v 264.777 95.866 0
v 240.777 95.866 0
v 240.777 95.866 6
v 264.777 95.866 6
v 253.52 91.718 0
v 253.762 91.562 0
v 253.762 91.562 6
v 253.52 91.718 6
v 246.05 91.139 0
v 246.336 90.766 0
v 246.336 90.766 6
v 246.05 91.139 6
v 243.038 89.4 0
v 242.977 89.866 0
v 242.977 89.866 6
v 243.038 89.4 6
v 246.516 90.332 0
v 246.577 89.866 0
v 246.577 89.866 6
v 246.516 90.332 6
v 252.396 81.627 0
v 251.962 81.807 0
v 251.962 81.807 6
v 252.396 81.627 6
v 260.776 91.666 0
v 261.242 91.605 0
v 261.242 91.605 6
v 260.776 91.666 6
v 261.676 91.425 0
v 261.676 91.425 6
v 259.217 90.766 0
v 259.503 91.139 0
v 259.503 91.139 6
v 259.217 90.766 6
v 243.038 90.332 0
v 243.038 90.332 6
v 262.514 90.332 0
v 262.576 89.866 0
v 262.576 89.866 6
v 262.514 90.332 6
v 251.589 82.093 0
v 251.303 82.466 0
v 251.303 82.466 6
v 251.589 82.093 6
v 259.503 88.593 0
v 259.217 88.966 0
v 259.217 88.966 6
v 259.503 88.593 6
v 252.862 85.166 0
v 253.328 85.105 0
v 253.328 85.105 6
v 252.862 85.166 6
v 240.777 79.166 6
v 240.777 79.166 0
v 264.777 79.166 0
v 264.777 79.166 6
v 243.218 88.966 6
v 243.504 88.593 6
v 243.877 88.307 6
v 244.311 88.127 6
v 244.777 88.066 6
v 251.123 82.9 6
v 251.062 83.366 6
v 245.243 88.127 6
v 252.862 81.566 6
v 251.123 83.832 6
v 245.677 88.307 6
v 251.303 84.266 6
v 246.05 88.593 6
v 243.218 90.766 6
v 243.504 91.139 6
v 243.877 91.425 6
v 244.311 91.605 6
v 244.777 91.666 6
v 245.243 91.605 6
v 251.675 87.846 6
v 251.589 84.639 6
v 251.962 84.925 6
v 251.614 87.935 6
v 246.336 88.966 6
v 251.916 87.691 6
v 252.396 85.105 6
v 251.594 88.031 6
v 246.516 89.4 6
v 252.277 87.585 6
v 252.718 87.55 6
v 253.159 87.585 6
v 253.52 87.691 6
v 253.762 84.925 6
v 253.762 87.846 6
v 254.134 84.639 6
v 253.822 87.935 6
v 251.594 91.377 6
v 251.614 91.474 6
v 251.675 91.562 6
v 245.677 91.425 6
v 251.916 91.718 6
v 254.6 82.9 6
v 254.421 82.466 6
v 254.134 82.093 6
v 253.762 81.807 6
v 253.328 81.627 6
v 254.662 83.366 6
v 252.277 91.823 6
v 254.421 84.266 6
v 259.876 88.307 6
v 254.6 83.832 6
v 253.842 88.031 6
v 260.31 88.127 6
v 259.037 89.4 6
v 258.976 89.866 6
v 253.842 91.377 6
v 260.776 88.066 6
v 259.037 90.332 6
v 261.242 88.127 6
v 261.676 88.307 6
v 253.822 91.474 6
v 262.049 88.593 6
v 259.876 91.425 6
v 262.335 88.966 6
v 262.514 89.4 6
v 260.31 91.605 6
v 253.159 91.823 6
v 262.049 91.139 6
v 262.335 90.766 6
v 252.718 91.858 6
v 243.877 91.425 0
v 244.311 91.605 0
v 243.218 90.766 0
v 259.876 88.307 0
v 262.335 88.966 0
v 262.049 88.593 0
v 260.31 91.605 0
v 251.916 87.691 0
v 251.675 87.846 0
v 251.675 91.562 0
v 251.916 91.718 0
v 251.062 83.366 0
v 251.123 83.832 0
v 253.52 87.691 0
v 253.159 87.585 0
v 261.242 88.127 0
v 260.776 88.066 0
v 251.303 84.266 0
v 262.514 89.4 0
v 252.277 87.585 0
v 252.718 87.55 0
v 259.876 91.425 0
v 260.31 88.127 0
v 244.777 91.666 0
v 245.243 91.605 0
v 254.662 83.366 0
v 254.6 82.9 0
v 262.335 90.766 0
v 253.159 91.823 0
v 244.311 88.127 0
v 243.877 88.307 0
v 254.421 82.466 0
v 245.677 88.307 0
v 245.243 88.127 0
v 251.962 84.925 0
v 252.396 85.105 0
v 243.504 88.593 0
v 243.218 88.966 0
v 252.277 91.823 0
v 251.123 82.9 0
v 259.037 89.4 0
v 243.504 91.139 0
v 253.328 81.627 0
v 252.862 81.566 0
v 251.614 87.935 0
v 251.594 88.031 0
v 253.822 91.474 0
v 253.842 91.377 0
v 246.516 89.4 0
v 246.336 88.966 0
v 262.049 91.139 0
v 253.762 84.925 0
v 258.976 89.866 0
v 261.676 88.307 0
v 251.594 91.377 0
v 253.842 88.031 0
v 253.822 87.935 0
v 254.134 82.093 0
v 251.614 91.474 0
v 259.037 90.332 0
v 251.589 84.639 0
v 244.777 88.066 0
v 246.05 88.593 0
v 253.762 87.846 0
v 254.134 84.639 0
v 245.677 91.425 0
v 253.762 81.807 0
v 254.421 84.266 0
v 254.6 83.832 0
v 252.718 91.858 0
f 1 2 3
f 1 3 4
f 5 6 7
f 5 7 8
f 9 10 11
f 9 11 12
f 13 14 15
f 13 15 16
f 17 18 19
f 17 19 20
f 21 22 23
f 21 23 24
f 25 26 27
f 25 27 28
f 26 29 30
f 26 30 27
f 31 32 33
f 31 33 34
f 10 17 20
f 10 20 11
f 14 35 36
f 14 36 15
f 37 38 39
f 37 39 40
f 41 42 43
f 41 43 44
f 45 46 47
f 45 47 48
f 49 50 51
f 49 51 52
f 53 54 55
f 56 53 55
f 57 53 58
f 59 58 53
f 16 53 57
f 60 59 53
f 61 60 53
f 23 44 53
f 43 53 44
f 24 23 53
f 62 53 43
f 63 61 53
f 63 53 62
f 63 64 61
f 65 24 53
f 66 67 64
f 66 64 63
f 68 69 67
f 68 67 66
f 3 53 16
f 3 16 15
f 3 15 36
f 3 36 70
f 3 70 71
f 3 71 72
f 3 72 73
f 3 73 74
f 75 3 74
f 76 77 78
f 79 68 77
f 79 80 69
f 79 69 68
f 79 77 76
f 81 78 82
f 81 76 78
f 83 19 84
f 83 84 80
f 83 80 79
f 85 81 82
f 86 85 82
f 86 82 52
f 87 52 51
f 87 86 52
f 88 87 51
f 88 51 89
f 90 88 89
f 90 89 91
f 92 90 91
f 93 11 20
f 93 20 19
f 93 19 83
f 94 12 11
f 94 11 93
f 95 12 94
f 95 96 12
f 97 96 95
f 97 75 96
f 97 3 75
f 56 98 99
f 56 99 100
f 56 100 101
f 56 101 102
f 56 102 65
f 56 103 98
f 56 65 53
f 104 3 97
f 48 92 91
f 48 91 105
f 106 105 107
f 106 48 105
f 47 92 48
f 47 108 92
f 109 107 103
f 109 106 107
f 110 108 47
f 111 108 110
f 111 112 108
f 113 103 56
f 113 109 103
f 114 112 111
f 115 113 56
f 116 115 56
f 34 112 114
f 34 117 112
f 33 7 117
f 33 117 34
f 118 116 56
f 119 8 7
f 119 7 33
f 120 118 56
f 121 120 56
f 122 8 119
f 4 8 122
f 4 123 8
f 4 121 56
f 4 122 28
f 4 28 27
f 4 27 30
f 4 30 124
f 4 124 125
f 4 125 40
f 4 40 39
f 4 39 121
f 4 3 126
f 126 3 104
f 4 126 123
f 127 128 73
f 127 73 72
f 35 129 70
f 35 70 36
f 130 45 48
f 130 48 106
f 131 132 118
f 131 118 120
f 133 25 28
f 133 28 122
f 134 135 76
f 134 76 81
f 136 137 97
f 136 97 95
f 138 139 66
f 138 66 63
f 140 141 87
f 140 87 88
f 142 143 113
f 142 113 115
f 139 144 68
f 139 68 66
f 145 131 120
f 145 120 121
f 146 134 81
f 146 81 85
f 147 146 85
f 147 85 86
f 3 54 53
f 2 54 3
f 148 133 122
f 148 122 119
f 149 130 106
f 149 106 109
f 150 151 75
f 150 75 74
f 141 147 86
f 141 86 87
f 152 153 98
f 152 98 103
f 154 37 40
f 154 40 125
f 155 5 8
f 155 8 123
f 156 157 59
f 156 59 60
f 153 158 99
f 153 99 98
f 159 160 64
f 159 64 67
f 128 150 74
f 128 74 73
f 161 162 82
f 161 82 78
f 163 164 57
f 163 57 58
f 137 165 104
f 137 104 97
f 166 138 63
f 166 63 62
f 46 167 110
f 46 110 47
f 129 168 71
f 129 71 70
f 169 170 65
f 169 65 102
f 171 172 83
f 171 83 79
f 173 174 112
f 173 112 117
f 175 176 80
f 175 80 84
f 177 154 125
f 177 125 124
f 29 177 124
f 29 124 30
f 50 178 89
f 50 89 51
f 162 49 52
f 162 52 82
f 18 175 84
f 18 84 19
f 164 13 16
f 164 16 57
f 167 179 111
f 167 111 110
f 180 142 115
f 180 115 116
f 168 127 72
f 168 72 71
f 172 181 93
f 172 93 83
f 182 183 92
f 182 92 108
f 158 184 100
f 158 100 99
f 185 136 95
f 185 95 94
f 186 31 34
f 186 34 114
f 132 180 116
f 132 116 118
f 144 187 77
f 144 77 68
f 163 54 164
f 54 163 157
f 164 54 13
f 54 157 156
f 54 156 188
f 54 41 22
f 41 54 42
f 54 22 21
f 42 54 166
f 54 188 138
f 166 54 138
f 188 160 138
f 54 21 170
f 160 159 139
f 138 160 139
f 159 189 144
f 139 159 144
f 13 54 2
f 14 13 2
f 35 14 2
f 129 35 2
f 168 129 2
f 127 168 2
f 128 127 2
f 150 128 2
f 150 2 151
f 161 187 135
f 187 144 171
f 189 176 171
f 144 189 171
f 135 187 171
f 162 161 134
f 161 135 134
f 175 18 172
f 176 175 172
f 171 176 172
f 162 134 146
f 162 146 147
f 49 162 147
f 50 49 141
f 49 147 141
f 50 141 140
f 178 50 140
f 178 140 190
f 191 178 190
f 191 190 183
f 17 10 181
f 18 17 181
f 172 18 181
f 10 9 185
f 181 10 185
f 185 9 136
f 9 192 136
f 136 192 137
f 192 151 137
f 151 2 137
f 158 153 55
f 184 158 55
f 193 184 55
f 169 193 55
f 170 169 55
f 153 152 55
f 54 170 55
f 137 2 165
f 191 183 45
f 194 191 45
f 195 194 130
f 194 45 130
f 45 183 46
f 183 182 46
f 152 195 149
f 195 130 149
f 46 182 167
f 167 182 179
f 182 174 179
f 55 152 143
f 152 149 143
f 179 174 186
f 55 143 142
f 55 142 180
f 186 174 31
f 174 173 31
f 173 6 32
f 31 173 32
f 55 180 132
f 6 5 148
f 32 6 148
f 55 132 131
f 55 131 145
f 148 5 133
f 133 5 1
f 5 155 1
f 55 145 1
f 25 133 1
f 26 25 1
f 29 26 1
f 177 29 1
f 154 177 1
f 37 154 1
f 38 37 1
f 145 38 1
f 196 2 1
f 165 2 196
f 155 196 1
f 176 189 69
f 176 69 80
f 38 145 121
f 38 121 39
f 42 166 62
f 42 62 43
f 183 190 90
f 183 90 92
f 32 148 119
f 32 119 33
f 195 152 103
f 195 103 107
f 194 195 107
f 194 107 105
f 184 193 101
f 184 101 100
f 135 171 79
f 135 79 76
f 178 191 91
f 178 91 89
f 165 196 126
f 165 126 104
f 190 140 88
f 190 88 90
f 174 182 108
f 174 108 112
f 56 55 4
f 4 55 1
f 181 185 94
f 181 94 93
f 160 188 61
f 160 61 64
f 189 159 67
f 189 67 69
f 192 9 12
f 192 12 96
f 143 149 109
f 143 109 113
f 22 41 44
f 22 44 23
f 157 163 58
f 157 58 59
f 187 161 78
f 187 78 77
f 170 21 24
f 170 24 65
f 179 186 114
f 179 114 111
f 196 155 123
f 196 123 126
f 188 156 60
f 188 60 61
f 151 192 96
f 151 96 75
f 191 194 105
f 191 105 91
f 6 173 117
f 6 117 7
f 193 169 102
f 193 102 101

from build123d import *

# Parameters (mm, degrees)
SKETCH1_W           = 23.99999232
SKETCH1_H           = 16.699994656
BOSS_EXTRUDE1_DEPTH = 6


with BuildPart() as part:
    # Sketch1 → Boss-Extrude1 (new body)
    with BuildSketch(Plane.XY):
        with Locations((252.776898883, 87.516141094)):
            Rectangle(SKETCH1_W, SKETCH1_H)
        Polygon((254.420508276, 82.46614271), (254.600328979, 82.90026829), (254.661662472, 83.366142422), (254.600328979, 83.832016554), (254.420508276, 84.266142134), (254.134454846, 84.638934221), (253.76166276, 84.92498765), (253.32753718, 85.104808353), (252.861663048, 85.166141846), (252.395788915, 85.104808353), (251.961663336, 84.92498765), (251.588871249, 84.638934221), (251.30281782, 84.266142134), (251.122997117, 83.832016554), (251.061663624, 83.366142422), (251.122997117, 82.90026829), (251.30281782, 82.46614271), (251.588871249, 82.093350624), (251.961663336, 81.807297194), (252.395788915, 81.627476491), (252.861663048, 81.566142998), (253.32753718, 81.627476491), (253.76166276, 81.807297194), (254.134454846, 82.093350624), align=None, mode=Mode.SUBTRACT)
        Polygon((260.30990578, 88.127474411), (260.775779912, 88.066140918), (261.241654045, 88.127474411), (261.675779624, 88.307295114), (262.048571711, 88.593348544), (262.33462514, 88.96614063), (262.514445843, 89.40026621), (262.575779336, 89.866140342), (262.514445843, 90.332014474), (262.33462514, 90.766140054), (262.048571711, 91.138932141), (261.675779624, 91.42498557), (261.241654045, 91.604806273), (260.775779912, 91.666139766), (260.30990578, 91.604806273), (259.8757802, 91.42498557), (259.502988114, 91.138932141), (259.216934685, 90.766140054), (259.037113982, 90.332014474), (258.975780488, 89.866140342), (259.037113982, 89.40026621), (259.216934685, 88.96614063), (259.502988114, 88.593348544), (259.8757802, 88.307295114), align=None, mode=Mode.SUBTRACT)
        Polygon((246.335746671, 90.766140054), (246.049693242, 91.138932141), (245.676901155, 91.42498557), (245.242775575, 91.604806273), (244.776901443, 91.666139766), (244.311027311, 91.604806273), (243.876901731, 91.42498557), (243.504109644, 91.138932141), (243.218056215, 90.766140054), (243.038235512, 90.332014474), (242.976902019, 89.866140342), (243.038235512, 89.40026621), (243.218056215, 88.96614063), (243.504109644, 88.593348544), (243.876901731, 88.307295114), (244.311027311, 88.127474411), (244.776901443, 88.066140918), (245.242775575, 88.127474411), (245.676901155, 88.307295114), (246.049693242, 88.593348544), (246.335746671, 88.96614063), (246.515567374, 89.40026621), (246.576900867, 89.866140342), (246.515567374, 90.332014474), align=None, mode=Mode.SUBTRACT)
        Polygon((251.594211482, 88.030941424), (251.614308424, 87.934752995), (251.674599249, 87.845978104), (251.91576255, 87.690668939), (252.277126402, 87.585307372), (252.718115827, 87.55018685), (253.159105252, 87.585307372), (253.520469104, 87.690668939), (253.761632405, 87.845978104), (253.82192323, 87.934752995), (253.842020171, 88.030941424), (253.842020171, 91.377359106), (253.82192323, 91.473547535), (253.761632405, 91.562322426), (253.520469104, 91.717631591), (253.159105252, 91.822993158), (252.718115827, 91.85811368), (252.277126402, 91.822993158), (251.91576255, 91.717631591), (251.674599249, 91.562322426), (251.614308424, 91.473547535), (251.594211482, 91.377359106), align=None, mode=Mode.SUBTRACT)
    extrude(amount=BOSS_EXTRUDE1_DEPTH)


solid = part.part
